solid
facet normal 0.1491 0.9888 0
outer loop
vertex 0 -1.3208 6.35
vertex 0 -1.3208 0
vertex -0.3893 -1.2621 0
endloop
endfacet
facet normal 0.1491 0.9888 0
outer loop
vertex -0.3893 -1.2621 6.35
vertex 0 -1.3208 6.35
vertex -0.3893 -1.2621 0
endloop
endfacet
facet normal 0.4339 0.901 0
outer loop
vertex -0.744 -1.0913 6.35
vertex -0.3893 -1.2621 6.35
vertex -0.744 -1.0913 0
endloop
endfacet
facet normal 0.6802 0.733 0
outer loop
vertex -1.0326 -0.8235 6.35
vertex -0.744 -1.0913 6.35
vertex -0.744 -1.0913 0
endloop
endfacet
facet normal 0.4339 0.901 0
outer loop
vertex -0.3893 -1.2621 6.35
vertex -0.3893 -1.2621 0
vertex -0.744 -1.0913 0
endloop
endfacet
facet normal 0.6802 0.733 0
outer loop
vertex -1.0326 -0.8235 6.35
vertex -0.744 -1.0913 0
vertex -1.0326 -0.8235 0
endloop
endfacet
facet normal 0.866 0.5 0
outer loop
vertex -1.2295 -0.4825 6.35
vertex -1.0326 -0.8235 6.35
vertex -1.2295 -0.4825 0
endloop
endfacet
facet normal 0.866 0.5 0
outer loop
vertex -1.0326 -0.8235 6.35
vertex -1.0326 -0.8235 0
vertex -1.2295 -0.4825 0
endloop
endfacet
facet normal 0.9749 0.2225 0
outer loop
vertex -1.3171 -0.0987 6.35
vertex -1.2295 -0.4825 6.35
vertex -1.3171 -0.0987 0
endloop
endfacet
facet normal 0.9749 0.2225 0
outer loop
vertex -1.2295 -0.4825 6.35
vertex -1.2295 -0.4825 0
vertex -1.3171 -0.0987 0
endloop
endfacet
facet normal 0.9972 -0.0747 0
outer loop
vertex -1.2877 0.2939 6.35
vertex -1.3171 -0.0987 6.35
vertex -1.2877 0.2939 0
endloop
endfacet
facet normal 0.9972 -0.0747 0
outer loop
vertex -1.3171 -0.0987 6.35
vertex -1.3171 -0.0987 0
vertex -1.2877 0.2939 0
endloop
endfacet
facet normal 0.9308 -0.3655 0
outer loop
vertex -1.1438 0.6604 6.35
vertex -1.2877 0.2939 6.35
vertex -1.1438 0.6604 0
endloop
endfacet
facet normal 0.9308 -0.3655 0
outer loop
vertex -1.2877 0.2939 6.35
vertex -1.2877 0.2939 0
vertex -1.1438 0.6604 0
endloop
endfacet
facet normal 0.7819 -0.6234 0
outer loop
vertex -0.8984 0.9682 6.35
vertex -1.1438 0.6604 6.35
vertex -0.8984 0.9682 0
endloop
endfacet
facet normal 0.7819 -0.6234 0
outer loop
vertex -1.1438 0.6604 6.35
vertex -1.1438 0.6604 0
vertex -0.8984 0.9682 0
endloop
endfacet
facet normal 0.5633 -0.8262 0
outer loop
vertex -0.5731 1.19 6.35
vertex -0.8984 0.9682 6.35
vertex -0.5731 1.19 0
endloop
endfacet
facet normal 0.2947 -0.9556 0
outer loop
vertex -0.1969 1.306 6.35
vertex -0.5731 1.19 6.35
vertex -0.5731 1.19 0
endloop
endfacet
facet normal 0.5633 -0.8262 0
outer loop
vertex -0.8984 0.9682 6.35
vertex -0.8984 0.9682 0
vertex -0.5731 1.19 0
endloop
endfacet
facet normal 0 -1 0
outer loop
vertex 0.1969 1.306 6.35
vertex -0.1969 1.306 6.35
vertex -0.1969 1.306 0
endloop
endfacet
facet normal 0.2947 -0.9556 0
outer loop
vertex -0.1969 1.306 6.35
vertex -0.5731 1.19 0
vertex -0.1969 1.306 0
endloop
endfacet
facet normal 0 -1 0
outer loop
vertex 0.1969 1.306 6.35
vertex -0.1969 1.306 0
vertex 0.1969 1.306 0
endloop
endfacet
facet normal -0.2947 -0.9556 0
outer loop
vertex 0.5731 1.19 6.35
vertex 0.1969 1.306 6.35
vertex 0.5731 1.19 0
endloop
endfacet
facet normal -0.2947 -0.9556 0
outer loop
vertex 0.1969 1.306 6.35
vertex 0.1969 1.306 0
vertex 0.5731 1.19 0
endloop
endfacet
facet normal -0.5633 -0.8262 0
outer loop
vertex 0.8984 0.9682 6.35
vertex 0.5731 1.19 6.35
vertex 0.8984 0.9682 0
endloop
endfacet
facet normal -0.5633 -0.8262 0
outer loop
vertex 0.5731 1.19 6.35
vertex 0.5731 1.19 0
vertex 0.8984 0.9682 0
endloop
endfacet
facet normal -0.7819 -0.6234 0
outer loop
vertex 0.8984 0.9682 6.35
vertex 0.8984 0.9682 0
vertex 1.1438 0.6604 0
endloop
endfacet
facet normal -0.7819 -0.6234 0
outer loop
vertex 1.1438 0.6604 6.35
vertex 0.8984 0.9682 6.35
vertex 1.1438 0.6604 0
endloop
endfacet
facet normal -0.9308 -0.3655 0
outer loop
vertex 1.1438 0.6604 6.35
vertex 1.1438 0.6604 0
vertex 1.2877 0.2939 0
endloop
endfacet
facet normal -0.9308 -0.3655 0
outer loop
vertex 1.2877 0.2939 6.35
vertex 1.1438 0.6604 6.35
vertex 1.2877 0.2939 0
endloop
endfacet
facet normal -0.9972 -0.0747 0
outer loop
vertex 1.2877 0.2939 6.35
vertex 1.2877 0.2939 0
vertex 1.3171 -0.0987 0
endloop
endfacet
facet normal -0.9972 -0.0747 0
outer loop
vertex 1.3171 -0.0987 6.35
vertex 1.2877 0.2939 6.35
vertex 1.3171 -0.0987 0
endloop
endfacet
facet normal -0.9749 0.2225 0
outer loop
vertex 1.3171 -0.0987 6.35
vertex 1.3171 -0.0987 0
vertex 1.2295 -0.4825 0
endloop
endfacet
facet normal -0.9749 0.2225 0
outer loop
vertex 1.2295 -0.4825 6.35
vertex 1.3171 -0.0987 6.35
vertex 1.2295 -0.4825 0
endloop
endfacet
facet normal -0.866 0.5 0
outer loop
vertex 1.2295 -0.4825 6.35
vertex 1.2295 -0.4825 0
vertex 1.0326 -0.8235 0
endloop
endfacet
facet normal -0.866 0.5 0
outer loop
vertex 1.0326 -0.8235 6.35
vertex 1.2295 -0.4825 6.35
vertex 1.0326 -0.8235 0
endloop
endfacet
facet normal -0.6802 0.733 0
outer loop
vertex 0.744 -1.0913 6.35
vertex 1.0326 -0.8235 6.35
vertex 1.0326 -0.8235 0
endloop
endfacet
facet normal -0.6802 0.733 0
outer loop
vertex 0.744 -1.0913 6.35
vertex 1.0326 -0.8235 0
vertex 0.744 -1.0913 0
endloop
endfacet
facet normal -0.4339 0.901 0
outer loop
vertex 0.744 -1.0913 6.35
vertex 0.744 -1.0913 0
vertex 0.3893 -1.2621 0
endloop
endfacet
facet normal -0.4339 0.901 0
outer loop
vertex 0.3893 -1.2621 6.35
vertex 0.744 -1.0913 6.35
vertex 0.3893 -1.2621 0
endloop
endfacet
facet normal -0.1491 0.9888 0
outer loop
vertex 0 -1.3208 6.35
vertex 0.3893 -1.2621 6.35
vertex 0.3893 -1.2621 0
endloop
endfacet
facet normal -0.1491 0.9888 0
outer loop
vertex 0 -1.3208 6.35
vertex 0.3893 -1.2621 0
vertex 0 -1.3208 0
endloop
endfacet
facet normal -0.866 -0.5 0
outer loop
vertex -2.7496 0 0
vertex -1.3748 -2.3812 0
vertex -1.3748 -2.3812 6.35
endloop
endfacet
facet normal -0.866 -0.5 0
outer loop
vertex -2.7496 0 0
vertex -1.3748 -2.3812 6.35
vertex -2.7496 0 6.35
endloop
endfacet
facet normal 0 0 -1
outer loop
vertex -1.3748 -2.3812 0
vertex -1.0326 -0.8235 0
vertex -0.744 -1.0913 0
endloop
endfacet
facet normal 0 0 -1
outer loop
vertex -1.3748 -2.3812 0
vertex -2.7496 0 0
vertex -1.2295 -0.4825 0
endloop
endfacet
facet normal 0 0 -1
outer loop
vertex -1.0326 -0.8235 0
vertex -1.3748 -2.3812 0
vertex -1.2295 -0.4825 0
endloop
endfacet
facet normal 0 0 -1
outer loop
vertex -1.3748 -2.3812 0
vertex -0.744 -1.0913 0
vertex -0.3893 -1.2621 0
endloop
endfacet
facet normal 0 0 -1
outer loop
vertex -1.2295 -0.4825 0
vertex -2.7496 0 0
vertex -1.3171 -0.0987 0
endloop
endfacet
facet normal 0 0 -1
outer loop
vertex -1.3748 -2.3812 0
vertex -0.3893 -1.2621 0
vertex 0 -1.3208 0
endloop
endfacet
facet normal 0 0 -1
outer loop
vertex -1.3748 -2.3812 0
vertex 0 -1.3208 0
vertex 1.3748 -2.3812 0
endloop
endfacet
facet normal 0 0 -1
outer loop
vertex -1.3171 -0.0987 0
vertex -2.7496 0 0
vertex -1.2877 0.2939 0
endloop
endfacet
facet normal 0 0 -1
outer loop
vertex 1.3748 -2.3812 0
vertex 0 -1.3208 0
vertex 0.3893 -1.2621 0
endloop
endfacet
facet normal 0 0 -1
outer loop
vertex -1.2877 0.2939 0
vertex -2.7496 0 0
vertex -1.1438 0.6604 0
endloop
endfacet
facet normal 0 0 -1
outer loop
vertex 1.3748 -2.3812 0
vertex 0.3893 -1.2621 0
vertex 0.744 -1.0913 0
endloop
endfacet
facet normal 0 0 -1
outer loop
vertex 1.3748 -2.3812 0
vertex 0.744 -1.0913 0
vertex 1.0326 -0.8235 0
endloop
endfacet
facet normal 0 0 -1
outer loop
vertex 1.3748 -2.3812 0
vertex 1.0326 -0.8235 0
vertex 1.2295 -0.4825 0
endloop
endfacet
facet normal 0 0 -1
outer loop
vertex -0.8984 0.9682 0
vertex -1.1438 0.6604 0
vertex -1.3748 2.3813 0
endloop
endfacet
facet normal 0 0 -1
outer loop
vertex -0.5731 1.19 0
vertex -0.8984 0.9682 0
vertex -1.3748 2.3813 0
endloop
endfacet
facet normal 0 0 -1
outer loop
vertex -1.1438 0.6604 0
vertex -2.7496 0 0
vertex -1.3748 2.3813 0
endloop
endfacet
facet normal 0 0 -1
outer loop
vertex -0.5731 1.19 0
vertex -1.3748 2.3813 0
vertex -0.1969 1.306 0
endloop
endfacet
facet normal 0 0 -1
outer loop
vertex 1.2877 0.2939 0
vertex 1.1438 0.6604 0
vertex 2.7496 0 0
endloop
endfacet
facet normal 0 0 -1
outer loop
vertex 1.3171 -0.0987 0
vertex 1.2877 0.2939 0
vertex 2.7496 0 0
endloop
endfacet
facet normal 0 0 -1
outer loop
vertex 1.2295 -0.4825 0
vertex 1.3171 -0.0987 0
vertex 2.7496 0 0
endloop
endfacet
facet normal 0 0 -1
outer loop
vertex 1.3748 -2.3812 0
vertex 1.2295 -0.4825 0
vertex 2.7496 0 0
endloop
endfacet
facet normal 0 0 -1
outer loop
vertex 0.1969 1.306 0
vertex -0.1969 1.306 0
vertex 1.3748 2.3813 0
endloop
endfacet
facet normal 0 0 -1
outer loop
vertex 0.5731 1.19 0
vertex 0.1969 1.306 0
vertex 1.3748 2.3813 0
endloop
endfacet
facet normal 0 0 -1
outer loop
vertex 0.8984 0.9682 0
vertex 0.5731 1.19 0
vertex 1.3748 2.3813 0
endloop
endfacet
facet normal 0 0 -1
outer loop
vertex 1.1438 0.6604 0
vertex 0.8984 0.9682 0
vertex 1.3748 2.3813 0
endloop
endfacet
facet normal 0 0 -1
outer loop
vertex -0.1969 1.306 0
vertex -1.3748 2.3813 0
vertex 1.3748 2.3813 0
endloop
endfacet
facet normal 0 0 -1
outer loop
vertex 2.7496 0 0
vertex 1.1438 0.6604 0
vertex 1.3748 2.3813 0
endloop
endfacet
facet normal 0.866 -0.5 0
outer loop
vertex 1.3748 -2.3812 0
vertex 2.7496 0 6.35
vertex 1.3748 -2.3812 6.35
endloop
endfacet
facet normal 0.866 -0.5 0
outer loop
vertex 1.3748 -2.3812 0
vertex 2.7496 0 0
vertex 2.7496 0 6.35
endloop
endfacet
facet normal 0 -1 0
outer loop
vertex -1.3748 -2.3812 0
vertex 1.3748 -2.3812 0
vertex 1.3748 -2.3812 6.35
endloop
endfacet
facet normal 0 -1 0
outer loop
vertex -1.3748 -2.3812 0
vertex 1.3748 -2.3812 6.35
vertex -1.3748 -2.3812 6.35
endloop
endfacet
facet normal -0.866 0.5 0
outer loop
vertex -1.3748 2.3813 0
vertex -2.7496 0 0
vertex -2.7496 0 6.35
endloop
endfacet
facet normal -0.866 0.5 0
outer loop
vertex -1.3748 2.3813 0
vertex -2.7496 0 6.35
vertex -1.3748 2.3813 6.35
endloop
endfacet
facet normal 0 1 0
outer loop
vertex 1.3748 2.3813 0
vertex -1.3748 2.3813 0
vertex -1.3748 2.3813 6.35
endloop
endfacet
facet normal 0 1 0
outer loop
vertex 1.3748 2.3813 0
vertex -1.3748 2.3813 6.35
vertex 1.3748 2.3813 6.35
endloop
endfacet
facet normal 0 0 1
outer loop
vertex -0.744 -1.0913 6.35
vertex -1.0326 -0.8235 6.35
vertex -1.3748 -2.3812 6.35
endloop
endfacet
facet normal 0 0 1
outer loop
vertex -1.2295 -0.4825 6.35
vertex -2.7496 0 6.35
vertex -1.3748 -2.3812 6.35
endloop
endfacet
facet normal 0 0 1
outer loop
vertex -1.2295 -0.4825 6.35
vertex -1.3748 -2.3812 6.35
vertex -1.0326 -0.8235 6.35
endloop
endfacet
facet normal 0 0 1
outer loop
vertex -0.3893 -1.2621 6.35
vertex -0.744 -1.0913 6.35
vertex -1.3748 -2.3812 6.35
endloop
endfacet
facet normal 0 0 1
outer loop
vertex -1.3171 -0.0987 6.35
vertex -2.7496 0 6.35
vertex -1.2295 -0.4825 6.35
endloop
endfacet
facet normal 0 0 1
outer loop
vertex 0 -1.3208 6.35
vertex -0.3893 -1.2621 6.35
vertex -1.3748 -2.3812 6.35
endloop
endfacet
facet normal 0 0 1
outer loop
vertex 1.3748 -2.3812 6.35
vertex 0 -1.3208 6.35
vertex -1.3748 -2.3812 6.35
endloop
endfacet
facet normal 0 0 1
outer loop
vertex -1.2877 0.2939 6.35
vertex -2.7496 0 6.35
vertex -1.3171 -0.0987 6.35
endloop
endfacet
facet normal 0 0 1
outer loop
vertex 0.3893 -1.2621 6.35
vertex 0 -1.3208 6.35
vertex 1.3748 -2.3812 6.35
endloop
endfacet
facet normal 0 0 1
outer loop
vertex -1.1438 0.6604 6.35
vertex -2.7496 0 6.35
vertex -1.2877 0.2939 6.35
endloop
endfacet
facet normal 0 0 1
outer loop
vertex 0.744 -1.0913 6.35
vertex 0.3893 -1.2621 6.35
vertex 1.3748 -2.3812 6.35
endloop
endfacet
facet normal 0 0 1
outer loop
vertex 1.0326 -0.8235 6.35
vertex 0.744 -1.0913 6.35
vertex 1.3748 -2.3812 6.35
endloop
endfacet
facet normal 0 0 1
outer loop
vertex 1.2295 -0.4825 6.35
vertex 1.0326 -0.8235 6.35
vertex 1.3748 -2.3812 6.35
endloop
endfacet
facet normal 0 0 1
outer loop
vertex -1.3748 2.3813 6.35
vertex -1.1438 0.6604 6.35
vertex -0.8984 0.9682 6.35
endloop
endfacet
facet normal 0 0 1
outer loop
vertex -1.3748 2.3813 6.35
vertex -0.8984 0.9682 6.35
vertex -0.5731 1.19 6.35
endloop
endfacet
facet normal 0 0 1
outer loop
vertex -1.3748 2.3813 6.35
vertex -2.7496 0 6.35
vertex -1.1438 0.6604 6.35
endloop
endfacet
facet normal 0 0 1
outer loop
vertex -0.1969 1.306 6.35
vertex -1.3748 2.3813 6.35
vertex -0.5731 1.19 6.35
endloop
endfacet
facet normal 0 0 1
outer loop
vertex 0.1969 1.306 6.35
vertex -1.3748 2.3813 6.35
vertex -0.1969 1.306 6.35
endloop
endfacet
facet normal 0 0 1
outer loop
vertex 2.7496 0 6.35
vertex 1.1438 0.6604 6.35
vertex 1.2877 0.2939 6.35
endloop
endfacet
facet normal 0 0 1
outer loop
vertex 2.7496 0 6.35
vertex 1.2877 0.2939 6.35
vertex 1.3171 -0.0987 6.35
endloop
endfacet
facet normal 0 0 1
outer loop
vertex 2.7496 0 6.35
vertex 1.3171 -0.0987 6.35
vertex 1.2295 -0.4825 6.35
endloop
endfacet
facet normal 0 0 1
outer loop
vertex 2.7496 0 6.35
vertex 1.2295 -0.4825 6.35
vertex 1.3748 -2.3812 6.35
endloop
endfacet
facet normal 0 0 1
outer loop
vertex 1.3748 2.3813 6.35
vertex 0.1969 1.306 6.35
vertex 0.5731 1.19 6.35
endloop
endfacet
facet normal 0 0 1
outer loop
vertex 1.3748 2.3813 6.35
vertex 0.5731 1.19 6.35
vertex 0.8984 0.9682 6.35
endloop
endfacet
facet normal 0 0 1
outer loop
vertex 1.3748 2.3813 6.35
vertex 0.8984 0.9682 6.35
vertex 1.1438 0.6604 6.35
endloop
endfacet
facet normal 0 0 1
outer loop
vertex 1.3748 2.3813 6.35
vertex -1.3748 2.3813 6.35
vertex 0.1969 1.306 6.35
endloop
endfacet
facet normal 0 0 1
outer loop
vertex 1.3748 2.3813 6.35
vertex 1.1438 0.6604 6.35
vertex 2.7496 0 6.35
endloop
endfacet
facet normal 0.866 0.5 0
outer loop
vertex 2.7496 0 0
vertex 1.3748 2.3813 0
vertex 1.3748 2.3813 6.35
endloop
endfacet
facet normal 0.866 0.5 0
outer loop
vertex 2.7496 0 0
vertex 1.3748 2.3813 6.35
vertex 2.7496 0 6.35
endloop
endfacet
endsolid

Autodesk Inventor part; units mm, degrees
ref_plane "YZ Plane" through (0, 0, 0) normal (1, 0, 0) x (0, 1, 0)
ref_plane "XZ Plane" through (0, 0, 0) normal (0, 1, 0) x (-1, 0, 0)
ref_plane "XY Plane" through (0, 0, 0) normal (0, 0, 1) x (1, 0, 0)
sketch "Sketch1" plane through (0, 0, 0) normal (0, 0, 1) x (1, 0, 0)
  line L0 (2.7496, 0) -> (1.3748, -2.3812)
  line L1 (1.3748, -2.3812) -> (-1.3748, -2.3812)
  line L2 (-1.3748, -2.3812) -> (-2.7496, 0)
  line L3 (-2.7496, 0) -> (-1.3748, 2.3813)
  line L4 (-1.3748, 2.3813) -> (1.3748, 2.3813)
  line L5 (1.3748, 2.3813) -> (2.7496, 0)
  point P0 (0, 0)
  point P1 (0, 0)
  dimension "Diameter" = 4.7625
extrude "Extrusion1" add sketch "Sketch1" along normal blind 6.35
sketch "Sketch2" plane through (0, 0, 6.35) normal (0, 0, 1) x (1, 0, 0)
  point P0 (0, 0)
  point P1 (0, 0)
hole "Hole1" at (0, 0, 6.35) direction (0, 0, -1) diameter 2.6416 end through all thread size "6-32 UNC" class "2B" standard "ANSI Unified Screw Threads"
properties part number "standoffiPart-01"
